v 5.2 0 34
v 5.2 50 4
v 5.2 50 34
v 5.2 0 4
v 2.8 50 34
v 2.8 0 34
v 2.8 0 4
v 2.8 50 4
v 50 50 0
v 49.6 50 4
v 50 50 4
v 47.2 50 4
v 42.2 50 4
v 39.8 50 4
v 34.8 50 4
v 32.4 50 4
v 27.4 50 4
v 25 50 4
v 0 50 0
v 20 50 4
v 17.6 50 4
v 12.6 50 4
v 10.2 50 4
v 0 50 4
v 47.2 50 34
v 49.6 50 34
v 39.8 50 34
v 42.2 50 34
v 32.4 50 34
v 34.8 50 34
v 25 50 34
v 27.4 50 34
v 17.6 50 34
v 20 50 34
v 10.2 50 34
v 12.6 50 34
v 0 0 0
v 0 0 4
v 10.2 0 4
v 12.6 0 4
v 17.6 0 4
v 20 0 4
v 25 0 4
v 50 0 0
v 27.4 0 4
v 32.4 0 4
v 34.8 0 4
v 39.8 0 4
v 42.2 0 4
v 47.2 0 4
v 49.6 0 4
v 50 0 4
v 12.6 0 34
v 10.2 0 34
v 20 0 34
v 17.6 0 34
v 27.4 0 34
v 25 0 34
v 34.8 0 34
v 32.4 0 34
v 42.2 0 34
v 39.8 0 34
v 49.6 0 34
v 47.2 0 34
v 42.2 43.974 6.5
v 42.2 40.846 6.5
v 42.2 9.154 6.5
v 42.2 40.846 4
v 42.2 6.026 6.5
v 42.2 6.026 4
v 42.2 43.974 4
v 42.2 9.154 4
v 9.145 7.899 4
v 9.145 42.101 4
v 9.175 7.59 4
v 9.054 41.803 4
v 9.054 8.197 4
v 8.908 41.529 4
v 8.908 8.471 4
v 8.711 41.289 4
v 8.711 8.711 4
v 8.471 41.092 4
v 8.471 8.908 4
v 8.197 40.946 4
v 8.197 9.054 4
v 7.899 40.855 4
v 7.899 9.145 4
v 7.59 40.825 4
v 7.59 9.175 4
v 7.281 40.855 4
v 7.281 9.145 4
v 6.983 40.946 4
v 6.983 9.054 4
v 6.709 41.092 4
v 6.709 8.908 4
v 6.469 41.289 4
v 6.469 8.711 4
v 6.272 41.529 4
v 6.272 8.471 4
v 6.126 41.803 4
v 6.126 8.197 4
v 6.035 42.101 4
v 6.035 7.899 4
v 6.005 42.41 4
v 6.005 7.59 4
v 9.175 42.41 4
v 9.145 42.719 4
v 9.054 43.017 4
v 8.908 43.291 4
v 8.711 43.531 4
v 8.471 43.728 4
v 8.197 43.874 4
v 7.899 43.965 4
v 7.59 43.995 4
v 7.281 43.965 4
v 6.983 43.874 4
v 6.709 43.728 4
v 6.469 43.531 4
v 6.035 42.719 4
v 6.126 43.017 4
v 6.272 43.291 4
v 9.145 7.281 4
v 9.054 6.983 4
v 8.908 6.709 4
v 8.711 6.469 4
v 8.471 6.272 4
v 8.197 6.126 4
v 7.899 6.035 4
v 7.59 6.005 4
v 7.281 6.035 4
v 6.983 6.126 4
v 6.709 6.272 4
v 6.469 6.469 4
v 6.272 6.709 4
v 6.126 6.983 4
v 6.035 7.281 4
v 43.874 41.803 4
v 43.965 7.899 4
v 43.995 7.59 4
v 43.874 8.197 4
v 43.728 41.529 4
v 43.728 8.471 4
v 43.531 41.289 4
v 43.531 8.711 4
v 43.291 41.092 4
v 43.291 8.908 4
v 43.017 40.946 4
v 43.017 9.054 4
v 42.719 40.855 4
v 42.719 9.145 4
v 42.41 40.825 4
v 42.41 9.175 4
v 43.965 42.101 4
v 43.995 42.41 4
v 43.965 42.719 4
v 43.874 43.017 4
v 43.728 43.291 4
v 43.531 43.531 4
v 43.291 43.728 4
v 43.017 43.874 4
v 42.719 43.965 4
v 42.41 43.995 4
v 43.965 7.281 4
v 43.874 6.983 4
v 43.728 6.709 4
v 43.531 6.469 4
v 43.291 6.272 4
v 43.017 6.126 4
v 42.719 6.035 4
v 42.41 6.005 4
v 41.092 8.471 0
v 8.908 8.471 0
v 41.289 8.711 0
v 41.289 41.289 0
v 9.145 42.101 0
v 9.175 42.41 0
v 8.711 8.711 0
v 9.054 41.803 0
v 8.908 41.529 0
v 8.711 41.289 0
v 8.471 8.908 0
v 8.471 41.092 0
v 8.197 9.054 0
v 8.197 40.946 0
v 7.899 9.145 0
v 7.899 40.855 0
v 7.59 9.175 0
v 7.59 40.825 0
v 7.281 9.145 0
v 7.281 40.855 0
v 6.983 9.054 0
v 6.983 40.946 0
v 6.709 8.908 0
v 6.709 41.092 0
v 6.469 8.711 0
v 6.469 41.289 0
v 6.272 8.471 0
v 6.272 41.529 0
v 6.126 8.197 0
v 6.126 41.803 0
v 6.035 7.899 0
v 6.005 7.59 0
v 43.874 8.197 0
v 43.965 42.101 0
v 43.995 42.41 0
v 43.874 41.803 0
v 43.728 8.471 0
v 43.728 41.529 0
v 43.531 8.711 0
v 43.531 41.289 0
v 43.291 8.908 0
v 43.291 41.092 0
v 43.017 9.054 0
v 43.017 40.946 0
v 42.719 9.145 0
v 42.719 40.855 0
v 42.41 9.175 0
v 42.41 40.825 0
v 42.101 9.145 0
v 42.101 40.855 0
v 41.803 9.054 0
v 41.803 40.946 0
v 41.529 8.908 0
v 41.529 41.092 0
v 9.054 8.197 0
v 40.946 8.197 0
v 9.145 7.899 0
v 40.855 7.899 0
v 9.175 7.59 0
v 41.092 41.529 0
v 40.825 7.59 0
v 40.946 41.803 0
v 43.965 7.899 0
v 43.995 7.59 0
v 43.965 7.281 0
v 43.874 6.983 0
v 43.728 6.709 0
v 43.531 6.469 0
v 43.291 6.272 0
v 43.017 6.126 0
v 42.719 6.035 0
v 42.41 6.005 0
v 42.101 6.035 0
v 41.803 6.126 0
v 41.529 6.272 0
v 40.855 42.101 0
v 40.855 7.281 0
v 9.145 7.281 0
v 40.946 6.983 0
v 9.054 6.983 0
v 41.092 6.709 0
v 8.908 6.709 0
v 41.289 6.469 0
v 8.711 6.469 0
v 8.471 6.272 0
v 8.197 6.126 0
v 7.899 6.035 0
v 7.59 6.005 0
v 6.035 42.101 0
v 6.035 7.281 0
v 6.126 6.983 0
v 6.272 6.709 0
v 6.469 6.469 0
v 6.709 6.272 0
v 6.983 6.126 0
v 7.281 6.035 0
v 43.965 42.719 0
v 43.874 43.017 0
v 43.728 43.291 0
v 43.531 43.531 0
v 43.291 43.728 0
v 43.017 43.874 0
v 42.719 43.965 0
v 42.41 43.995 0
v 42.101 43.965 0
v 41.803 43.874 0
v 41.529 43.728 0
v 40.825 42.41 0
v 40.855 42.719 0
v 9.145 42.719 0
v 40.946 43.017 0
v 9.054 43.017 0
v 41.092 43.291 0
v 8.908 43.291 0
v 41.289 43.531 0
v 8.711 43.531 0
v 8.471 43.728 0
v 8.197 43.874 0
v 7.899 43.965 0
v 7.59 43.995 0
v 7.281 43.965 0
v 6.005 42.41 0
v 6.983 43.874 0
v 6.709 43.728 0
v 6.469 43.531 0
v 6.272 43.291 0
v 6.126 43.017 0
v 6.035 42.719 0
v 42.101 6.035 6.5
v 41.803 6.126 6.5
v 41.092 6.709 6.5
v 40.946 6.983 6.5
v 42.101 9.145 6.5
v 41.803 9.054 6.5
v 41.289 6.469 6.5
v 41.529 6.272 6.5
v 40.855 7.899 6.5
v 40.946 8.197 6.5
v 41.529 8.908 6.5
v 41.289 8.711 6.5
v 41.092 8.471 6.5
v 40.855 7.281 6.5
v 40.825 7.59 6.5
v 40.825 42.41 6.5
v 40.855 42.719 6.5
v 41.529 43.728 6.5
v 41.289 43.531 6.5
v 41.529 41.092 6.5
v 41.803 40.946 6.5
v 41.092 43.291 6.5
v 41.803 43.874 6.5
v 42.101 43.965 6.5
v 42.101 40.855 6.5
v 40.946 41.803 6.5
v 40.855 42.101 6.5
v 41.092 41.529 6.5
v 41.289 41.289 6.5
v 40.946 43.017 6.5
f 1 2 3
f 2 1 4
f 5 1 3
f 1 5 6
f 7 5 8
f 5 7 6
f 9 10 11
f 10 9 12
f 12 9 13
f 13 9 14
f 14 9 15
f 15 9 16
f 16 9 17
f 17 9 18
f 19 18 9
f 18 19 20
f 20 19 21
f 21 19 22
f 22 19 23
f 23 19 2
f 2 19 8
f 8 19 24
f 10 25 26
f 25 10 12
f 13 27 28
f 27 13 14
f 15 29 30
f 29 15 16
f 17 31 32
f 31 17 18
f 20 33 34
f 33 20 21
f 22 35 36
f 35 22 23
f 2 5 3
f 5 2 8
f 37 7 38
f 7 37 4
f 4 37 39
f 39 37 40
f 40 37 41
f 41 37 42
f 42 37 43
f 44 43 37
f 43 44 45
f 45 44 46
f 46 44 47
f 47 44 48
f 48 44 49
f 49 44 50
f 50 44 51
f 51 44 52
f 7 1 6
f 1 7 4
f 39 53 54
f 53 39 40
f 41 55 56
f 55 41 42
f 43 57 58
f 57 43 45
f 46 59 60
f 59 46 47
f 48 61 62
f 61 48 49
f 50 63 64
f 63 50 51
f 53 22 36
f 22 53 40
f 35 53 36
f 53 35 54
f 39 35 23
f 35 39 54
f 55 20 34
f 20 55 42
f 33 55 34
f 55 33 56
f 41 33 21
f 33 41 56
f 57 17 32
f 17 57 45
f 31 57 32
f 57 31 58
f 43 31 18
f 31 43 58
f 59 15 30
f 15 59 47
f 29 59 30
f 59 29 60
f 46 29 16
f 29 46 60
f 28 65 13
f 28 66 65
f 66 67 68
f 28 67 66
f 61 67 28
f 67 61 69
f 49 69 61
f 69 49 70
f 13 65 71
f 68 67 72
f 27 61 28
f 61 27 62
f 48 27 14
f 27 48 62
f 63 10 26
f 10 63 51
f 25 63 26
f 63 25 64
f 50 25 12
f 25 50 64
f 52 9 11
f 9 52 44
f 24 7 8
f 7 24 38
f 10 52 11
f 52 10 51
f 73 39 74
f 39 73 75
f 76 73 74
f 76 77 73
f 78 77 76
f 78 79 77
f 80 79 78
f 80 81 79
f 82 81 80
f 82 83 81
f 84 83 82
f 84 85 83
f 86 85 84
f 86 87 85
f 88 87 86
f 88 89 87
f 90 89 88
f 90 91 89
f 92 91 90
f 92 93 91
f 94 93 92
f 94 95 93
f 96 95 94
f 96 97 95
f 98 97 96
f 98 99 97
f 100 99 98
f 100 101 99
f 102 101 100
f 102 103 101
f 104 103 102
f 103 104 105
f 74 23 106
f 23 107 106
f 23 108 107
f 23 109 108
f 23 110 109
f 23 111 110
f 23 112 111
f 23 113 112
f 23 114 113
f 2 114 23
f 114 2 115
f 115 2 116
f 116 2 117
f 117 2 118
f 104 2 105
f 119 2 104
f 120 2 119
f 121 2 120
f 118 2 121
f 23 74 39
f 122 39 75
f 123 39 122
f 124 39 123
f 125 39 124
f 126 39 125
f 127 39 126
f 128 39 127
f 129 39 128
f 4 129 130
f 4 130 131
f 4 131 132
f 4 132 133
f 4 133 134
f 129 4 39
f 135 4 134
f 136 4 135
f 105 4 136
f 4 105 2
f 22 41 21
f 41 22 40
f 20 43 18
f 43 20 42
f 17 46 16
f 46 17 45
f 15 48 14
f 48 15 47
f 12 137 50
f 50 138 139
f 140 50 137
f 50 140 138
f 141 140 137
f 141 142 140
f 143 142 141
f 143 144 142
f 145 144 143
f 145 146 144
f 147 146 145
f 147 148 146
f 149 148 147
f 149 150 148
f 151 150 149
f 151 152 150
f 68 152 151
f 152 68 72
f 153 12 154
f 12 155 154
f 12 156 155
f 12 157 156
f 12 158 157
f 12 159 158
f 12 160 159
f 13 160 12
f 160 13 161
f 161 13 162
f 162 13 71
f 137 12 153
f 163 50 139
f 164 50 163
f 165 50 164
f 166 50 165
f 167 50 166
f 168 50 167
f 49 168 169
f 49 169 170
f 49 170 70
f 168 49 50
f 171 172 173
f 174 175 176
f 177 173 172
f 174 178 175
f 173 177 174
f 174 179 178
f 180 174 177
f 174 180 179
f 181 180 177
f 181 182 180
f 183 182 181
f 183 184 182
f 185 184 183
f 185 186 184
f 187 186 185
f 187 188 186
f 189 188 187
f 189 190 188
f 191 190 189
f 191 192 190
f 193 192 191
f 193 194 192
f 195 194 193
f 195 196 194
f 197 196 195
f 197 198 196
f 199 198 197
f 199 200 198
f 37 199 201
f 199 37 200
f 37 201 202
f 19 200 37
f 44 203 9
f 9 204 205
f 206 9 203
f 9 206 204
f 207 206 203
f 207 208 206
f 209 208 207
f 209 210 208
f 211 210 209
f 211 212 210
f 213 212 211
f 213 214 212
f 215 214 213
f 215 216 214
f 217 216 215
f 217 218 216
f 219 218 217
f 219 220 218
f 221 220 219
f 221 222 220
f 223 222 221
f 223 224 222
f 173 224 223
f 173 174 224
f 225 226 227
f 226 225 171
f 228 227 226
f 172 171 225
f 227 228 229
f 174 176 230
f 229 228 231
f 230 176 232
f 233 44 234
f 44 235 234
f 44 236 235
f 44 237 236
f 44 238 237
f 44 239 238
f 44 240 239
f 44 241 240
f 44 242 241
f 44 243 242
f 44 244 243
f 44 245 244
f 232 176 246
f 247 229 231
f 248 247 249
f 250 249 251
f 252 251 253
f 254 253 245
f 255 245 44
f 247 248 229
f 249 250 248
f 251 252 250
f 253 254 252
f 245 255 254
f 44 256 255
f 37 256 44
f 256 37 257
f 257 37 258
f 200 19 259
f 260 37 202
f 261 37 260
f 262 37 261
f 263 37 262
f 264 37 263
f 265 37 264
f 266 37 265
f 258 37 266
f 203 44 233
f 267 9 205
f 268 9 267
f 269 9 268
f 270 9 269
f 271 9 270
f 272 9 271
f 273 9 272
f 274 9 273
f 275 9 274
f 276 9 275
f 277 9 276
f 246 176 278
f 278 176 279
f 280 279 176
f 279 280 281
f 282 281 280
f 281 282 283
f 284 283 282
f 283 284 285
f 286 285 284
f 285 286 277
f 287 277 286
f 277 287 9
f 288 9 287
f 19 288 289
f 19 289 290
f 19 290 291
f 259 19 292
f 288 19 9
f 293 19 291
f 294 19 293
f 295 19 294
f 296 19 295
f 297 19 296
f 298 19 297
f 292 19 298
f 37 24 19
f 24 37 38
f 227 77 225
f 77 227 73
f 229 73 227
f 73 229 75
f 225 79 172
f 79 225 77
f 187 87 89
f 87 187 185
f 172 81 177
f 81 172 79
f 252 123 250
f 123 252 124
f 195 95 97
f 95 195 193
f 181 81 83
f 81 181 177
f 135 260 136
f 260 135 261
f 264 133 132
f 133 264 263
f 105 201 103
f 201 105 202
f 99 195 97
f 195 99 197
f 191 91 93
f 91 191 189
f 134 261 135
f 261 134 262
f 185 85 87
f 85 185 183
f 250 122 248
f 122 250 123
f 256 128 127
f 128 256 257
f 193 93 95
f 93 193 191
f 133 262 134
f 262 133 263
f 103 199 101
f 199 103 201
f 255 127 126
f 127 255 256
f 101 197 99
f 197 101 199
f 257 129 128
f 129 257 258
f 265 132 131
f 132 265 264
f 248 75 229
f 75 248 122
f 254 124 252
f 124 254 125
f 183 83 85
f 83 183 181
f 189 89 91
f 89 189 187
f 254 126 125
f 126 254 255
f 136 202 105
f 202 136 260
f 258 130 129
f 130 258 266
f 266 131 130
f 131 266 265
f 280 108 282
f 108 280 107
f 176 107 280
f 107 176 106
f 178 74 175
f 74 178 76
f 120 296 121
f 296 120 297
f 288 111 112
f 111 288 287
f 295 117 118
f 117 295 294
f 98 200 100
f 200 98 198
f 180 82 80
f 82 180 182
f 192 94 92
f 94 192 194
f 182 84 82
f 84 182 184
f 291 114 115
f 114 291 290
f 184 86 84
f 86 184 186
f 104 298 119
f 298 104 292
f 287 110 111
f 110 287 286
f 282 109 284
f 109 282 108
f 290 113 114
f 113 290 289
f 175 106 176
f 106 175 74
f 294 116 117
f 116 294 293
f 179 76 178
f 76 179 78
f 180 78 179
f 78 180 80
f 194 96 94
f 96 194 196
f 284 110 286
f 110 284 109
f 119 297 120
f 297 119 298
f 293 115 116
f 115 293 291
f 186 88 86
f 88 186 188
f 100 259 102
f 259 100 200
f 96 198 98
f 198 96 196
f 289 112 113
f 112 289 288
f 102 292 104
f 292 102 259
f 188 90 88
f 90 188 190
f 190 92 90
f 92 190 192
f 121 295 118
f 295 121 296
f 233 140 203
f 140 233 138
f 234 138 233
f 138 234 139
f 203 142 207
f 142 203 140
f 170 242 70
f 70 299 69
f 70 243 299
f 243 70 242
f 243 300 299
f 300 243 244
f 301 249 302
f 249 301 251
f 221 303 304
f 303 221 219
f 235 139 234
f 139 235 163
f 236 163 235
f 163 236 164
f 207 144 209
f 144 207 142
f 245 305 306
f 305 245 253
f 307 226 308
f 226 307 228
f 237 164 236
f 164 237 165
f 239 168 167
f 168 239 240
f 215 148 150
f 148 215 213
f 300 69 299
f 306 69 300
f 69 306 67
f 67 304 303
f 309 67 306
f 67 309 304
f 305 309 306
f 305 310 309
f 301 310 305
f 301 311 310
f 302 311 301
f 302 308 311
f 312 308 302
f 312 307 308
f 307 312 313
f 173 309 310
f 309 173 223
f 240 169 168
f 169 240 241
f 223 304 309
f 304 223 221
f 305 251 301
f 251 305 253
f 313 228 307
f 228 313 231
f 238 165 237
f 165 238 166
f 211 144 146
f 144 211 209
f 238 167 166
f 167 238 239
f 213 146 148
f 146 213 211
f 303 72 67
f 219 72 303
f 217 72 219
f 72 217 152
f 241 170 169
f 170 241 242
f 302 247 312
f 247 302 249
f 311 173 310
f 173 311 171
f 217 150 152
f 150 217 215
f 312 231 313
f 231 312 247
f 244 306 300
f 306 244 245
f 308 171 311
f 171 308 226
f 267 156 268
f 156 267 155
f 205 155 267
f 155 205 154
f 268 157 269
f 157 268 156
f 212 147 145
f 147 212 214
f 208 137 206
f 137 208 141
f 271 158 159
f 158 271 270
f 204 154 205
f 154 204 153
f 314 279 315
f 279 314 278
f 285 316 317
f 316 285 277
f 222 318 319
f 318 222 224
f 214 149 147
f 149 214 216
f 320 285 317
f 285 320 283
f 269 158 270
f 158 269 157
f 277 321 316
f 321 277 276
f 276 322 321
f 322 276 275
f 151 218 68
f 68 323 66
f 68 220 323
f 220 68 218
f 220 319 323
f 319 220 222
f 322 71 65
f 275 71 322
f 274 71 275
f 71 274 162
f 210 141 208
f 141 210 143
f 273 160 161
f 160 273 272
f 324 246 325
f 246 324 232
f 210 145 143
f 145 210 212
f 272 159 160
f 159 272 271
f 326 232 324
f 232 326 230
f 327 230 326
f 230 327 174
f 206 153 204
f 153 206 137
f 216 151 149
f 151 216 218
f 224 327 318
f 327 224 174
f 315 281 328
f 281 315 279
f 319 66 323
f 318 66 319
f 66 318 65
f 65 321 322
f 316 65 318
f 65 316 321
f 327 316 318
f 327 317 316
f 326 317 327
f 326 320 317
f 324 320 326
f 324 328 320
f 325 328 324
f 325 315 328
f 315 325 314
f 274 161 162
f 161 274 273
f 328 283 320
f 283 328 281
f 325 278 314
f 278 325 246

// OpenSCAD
$fn = 32;

// ----------------------------------------------------------------------
// Finned heat sink: 50 x 50 mm base, 30 mm fins
// ----------------------------------------------------------------------

// --- parameters (mm) ---
base_w = 50;              // base width
base_d = 50;              // base depth
base_t = 4;               // base thickness
fin_h = 30;               // fin height above the base
holes_d = 3.17;           // fixing holes
hole_x = 17.41;           // hole offset in x
hole_y = 17.41;           // hole offset in y
fin_t = 2.4;              // fin thickness
fin_pitch = 7.4;          // fin pitch
fin_count = 7;            // number of fins
fin_x0 = 2.8;             // first fin offset

difference() {
  union() {
    cube([base_w, base_d, base_t]);
    for (i = [0 : fin_count - 1]) {
      translate([fin_x0 + i * fin_pitch, 0, base_t - 0.5]) cube([fin_t, base_d, fin_h + 0.5]);
    }
  }
  /* fixing holes through the base, 2.5 mm clear on both sides */
  for (hx = [-17.41, 17.41]) {
    for (hy = [-17.41, 17.41]) {
      translate([base_w / 2 + hx, base_d / 2 + hy, -2.5]) cylinder(h = base_t + 5, d = holes_d);
    }
  }
}
